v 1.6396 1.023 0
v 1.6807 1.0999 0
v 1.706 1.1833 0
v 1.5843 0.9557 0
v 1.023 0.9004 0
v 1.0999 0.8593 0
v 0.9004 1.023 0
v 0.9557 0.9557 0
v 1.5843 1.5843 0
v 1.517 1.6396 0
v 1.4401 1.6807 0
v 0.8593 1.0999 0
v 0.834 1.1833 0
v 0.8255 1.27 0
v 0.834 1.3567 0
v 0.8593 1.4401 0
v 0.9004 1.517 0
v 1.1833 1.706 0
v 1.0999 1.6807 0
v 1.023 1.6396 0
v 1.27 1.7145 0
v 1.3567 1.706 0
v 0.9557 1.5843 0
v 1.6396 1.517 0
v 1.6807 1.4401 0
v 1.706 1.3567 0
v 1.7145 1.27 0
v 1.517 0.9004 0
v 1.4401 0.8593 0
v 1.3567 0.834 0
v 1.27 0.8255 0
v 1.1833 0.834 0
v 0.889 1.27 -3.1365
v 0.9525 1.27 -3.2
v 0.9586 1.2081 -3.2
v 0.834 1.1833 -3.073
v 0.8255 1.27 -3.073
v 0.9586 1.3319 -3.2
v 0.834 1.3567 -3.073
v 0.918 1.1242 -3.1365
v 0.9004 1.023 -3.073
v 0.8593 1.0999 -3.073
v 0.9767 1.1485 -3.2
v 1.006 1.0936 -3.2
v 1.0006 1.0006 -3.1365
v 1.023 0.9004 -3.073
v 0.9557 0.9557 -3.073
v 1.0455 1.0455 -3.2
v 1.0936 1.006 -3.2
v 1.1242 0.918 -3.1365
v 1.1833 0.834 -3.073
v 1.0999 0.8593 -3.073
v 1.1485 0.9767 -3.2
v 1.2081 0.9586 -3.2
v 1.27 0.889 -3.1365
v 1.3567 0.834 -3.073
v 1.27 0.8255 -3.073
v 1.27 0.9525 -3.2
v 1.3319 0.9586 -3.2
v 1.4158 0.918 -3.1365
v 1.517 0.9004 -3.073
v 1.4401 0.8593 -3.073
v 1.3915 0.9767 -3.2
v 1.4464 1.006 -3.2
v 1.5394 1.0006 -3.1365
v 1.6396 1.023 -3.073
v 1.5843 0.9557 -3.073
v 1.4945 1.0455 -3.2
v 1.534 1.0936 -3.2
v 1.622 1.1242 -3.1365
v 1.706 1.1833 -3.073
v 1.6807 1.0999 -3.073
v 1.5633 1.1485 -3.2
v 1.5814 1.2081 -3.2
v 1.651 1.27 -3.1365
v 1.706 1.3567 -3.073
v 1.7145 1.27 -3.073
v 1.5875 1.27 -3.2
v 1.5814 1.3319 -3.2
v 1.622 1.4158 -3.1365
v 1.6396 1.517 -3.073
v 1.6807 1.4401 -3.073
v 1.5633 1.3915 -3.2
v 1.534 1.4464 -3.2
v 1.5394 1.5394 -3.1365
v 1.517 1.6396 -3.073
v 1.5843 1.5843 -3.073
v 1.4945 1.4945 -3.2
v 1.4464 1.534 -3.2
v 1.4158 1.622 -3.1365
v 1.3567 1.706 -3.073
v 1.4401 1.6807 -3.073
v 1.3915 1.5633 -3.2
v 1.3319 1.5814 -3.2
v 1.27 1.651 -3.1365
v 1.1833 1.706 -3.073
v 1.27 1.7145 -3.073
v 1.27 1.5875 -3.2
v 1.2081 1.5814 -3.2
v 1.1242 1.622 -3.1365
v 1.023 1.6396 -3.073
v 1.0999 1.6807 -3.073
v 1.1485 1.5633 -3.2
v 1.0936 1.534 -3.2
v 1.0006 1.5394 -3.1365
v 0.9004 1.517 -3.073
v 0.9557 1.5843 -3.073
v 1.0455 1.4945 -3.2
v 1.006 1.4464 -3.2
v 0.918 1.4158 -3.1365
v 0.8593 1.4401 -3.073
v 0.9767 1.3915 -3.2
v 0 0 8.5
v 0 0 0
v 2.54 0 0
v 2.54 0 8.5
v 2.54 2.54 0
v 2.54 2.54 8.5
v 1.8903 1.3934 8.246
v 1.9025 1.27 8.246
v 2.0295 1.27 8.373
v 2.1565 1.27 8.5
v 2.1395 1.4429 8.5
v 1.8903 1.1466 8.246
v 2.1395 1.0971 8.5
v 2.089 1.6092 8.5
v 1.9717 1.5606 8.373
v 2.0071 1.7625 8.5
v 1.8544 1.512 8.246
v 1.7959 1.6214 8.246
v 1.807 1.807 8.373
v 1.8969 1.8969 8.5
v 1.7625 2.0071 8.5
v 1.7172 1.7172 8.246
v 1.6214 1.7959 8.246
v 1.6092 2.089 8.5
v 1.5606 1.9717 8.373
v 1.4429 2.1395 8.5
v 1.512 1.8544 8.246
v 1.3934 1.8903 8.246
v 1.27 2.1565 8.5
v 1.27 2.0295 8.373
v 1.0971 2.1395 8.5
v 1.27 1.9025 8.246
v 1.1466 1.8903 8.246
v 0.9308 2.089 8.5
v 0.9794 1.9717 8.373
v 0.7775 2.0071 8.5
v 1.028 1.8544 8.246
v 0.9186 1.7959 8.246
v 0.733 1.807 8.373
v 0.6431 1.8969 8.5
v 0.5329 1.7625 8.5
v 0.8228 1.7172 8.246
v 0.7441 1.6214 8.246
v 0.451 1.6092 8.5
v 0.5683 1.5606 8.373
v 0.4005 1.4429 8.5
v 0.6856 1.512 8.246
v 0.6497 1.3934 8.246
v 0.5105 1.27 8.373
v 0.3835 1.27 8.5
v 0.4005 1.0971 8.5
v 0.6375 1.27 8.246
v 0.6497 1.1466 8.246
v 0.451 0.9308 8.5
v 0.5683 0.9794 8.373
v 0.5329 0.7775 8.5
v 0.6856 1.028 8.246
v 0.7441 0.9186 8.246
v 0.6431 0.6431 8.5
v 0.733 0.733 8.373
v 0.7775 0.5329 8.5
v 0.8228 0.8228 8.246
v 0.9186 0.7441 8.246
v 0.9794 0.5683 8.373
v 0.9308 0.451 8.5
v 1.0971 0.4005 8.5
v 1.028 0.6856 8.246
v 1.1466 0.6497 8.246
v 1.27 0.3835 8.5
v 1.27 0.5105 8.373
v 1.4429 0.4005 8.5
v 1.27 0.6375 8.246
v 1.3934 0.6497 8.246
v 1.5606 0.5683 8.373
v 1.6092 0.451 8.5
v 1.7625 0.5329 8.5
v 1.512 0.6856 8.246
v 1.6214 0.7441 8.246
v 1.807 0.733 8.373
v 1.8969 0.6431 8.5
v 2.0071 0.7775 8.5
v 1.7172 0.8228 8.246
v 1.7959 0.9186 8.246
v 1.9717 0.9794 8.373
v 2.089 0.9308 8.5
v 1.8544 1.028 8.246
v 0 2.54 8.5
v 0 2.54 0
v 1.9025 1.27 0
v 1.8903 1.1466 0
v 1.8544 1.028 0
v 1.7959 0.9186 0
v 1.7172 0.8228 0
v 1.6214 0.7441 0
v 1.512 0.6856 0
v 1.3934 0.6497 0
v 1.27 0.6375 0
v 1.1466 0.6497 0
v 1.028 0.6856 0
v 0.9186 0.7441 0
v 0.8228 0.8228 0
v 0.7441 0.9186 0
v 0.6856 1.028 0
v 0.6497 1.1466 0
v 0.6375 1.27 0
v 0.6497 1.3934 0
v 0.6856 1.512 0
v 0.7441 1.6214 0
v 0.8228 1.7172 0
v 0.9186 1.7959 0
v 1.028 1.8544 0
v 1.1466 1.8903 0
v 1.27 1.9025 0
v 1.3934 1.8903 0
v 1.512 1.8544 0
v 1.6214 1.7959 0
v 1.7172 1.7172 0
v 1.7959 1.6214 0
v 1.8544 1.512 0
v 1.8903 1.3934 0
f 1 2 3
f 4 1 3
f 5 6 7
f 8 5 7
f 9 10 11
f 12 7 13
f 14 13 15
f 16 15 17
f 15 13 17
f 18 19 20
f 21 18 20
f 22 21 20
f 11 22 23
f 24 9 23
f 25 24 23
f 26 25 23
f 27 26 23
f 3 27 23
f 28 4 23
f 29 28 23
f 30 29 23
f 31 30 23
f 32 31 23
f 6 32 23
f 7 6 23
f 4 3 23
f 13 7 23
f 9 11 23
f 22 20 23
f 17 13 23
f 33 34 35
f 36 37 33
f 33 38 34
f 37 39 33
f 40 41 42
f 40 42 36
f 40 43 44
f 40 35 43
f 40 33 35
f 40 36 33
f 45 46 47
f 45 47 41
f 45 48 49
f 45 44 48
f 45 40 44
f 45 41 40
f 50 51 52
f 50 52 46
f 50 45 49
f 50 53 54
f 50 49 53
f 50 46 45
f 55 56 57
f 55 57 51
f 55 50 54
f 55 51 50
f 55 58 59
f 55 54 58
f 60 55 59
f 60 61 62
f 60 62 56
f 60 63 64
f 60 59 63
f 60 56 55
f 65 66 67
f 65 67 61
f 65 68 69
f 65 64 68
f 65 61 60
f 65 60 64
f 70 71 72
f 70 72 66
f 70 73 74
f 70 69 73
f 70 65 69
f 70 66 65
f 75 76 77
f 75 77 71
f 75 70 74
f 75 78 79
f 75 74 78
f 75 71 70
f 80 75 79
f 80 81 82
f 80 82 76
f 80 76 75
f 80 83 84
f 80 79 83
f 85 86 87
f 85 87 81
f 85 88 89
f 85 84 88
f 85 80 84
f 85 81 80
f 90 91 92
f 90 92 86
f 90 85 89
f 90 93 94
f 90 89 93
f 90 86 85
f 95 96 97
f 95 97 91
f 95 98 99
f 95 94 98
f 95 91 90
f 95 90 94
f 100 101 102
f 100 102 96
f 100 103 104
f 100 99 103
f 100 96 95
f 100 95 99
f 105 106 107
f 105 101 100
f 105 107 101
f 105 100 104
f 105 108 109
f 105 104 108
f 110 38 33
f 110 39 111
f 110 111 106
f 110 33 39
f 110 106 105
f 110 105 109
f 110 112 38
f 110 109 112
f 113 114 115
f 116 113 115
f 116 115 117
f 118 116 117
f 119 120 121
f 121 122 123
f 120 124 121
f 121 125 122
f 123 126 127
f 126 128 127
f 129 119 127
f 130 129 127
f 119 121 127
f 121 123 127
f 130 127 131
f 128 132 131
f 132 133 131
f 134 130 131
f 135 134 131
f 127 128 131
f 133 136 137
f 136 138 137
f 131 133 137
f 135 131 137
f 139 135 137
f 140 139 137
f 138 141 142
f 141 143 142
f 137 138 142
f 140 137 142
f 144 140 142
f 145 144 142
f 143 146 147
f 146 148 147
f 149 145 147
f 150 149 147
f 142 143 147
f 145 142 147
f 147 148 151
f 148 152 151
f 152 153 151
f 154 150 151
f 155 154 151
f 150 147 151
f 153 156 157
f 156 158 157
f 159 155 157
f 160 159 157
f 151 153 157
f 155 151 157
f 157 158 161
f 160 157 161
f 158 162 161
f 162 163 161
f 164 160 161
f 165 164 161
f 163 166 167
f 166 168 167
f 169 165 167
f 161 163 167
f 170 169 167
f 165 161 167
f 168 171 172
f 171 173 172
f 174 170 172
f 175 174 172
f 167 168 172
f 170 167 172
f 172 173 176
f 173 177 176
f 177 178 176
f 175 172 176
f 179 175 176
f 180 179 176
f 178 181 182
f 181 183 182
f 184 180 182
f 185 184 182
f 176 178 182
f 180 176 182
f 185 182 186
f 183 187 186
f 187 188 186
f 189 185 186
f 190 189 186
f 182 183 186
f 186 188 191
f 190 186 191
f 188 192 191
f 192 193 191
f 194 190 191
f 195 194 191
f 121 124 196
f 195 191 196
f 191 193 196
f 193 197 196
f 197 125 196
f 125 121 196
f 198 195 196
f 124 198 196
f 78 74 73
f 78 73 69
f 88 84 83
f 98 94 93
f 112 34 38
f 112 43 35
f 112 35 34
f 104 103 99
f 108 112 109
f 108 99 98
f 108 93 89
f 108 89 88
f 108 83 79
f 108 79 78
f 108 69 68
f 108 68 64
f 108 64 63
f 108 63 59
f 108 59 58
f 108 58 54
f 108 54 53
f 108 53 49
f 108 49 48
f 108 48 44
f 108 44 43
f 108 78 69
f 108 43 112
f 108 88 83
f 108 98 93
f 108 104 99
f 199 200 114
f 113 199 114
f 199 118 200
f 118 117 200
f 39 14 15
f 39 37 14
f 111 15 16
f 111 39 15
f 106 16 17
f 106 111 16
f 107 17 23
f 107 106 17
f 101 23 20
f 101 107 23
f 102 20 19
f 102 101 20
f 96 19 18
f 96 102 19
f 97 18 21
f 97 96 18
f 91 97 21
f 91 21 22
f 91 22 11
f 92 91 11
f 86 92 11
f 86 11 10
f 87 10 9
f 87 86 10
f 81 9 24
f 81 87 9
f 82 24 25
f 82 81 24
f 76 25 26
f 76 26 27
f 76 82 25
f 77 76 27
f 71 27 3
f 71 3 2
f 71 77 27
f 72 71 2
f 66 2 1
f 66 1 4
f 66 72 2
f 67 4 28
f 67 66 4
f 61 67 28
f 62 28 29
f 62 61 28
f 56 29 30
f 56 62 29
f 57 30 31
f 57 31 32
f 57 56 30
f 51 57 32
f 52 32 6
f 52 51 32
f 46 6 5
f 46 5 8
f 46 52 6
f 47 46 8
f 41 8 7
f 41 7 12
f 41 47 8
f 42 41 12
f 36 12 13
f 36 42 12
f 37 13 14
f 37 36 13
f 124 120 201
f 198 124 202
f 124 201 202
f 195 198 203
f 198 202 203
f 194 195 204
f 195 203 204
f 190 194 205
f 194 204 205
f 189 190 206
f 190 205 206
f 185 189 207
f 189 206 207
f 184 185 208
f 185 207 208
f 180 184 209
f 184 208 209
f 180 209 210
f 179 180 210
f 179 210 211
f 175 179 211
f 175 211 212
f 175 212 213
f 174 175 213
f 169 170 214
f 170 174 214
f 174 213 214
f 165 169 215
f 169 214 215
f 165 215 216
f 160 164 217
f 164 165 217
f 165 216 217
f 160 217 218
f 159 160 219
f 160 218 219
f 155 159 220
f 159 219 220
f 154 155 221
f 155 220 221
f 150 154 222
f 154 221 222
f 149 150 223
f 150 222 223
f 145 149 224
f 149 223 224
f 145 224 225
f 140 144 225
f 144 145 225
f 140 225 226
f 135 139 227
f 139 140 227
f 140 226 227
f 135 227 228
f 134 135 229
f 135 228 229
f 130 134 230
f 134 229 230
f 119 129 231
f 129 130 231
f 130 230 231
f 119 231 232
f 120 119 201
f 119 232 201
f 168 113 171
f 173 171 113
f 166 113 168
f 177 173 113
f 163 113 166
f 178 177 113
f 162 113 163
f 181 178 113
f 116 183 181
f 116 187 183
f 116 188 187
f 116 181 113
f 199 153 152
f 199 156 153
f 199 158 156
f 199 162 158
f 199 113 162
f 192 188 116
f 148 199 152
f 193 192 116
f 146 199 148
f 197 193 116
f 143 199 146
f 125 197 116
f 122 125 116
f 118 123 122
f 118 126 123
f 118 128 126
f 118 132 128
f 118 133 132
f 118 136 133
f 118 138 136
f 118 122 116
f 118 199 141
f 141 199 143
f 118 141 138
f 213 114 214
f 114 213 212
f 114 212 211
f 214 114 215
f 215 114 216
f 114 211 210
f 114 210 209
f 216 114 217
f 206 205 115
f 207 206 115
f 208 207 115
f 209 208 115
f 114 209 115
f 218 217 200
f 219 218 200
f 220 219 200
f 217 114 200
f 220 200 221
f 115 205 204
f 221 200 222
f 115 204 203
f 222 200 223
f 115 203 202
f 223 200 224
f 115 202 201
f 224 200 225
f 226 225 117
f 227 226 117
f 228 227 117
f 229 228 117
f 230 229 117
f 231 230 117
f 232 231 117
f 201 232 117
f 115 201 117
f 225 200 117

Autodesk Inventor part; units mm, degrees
ref_plane "YZ Plane" through (0, 0, 0) normal (1, 0, 0) x (0, 1, 0)
ref_plane "XZ Plane" through (0, 0, 0) normal (0, 1, 0) x (-1, 0, 0)
ref_plane "XY Plane" through (0, 0, 0) normal (0, 0, 1) x (1, 0, 0)
sketch "Sketch1" plane through (0, 0, 0) normal (0, 0, 1) x (1, 0, 0)
  line L0 (0, 0) -> (2.54, 0)
  line L1 (2.54, 0) -> (2.54, 2.54)
  line L2 (2.54, 2.54) -> (0, 2.54)
  line L3 (0, 2.54) -> (0, 0)
  circle A0 centre (1.27, 1.27) radius 0.6325
  point P0 (1.27, 2.54)
  point P1 (2.54, 1.27)
  dimension "d0" = 2.54
  dimension "d1" = 2.54
extrude "Extrusion1" add sketch "Sketch1" along normal blind 8.5
chamfer "Chamfer1" distance 0.254 angle 45 1 edges at (0.6375, 1.27, 8.5)
sketch "Sketch2" plane through (0, 0, 0) normal (0, 0, -1) x (-1, 0, 0)
  circle A0 centre (-1.27, 1.27) radius 0.6325 projected
  point P0 (0, 0)
extrude "Extrusion2" add sketch "Sketch2" along normal blind 3.2
sketch "Sketch4" plane through (1.27, 1.27, -3.2) normal (0, 0, -1) x (-1, 0, 0)
  circle A0 centre (0, 0) radius 0.4445
  circle A1 centre (0, 0) radius 1.2214
  point P0 (1.27, -1.27)
  dimension "d15" = 0.889
extrude "Extrusion4" cut sketch "Sketch4" against normal blind 3.2
chamfer "Chamfer3" distance 0.127 angle 45 1 edges at (1.7145, 1.27, -3.2)
properties part number "Female Header"
